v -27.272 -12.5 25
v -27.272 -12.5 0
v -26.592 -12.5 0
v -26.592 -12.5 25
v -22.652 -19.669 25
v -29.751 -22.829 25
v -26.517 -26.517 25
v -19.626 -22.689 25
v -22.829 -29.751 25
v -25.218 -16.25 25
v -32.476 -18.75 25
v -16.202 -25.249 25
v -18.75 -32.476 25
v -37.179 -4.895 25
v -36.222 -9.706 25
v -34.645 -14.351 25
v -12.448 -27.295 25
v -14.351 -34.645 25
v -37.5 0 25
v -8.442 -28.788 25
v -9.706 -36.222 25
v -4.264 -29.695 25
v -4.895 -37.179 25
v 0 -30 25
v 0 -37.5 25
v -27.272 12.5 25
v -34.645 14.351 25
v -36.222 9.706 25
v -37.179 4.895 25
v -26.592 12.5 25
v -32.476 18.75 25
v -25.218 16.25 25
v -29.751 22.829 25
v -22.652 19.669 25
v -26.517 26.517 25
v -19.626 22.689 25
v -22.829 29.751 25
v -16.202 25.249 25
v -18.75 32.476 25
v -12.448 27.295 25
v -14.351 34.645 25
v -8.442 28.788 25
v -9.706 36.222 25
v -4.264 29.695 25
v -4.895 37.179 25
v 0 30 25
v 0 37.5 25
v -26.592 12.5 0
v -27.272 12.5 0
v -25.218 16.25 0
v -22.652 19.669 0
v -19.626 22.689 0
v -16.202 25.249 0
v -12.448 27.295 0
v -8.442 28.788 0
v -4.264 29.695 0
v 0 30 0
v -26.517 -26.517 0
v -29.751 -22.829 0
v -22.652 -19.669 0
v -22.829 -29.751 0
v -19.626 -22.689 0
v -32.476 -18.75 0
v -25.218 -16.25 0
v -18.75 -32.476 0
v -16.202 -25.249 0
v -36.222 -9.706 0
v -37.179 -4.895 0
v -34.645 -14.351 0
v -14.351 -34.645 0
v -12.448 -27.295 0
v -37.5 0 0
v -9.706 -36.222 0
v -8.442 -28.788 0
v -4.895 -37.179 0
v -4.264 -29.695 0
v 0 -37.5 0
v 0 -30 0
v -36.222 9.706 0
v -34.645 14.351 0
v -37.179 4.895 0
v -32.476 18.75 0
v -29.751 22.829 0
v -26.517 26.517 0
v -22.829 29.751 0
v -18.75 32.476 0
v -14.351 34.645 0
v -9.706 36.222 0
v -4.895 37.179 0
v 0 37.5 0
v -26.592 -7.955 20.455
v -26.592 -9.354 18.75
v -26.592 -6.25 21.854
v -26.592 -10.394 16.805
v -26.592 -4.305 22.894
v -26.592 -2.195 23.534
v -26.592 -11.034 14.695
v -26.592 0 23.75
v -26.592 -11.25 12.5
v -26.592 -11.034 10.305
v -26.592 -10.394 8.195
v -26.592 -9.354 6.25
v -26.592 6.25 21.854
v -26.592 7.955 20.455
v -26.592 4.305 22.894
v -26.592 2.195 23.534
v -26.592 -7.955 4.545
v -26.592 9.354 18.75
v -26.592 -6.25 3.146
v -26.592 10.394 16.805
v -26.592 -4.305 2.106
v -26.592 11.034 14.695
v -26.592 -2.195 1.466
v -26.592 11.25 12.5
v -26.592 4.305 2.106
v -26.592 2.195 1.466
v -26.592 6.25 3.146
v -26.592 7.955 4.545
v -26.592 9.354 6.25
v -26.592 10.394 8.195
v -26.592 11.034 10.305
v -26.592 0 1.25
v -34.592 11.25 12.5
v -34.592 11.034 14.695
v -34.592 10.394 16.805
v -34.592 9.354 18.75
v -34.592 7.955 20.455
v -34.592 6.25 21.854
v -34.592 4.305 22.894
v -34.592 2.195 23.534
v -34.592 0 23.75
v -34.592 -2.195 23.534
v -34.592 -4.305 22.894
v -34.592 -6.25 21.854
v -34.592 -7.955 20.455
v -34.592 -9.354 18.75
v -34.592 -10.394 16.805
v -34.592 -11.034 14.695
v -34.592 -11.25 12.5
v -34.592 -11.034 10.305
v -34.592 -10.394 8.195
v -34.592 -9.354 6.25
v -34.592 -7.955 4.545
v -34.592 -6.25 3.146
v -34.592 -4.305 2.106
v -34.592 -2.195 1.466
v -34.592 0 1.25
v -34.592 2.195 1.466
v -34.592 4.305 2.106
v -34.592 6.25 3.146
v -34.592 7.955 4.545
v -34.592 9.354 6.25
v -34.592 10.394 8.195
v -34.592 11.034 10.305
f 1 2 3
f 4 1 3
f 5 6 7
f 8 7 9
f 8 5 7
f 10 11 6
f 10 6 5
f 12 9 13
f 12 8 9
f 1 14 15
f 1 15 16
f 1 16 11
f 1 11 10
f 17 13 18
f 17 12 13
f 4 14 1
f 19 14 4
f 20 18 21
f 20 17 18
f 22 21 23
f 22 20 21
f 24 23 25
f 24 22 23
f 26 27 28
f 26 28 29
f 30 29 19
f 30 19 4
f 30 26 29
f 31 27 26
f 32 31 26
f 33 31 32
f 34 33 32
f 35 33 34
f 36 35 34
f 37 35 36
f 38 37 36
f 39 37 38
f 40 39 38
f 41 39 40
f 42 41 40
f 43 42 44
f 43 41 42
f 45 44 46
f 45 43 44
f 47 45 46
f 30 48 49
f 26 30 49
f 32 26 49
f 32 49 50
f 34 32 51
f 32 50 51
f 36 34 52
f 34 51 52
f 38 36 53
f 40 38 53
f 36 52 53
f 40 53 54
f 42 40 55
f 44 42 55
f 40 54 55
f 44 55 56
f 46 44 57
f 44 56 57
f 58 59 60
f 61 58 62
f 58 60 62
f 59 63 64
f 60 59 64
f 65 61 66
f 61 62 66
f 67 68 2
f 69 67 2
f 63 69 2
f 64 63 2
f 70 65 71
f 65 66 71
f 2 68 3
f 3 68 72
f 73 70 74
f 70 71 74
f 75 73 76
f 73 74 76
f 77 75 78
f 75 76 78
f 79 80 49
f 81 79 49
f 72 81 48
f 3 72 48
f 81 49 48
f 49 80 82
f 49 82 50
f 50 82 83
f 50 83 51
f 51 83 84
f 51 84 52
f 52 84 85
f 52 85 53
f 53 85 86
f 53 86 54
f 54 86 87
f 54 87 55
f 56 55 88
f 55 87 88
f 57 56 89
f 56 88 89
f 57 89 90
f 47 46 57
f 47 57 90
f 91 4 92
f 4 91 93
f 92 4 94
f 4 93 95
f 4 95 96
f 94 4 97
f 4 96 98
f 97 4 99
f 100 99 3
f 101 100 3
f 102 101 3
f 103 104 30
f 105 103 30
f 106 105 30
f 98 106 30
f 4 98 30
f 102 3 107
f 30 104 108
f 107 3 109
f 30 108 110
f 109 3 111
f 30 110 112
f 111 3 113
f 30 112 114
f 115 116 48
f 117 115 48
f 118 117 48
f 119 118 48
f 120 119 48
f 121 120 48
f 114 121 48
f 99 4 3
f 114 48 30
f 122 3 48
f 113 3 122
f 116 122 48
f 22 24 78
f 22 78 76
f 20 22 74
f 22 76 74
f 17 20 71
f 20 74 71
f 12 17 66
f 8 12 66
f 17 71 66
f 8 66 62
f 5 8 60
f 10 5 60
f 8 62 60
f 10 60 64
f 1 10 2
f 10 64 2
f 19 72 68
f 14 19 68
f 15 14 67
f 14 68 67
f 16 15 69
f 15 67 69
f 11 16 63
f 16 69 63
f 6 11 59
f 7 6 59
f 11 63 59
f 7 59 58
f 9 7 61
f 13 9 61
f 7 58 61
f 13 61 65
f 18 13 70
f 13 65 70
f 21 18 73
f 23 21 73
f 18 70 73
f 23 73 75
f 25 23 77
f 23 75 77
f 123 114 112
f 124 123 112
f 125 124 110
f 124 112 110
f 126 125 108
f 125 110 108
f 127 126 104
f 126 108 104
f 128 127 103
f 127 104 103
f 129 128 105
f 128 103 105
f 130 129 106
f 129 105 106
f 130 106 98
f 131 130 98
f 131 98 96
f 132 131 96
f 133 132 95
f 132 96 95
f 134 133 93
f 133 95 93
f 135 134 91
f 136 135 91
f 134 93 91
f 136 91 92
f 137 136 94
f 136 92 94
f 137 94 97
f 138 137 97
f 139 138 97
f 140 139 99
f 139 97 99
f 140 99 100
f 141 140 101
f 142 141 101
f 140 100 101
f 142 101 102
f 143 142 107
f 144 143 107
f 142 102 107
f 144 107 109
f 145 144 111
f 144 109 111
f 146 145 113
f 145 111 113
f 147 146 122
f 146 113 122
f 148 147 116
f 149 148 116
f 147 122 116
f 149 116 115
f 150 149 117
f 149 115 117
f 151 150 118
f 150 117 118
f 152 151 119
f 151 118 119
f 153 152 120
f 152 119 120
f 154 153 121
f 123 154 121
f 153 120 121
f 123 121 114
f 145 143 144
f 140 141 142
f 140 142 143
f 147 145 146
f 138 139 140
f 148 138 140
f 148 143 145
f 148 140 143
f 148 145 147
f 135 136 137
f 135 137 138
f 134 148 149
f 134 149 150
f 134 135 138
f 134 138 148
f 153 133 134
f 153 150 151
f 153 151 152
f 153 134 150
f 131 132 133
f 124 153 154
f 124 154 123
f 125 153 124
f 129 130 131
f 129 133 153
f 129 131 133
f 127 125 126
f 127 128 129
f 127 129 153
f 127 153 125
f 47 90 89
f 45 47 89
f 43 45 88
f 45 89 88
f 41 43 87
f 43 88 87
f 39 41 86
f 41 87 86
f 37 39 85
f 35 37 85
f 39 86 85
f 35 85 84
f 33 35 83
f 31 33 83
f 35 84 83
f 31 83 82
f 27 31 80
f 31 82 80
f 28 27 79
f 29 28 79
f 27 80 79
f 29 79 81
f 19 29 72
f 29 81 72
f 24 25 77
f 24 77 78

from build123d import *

# Parameters (mm, degrees)
F1_DEPTH = 25
F2_R     = 11.25
F3_DEPTH = 8


with BuildPart() as f1:
    # F0 (on Top) → F1 (new body)
    with BuildSketch(Plane.XY):
        with BuildLine():
            ThreePointArc((0, -30), (-16.201852, -25.248762), (-27.27178, -12.5))
            Line((-27.27178, -12.5), (-26.592, -12.5))
            Line((-26.592, -12.5), (-26.592, 0))
            Line((-26.592, 0), (-26.592, 12.5))
            Line((-26.592, 12.5), (-27.27178, 12.5))
            ThreePointArc((-27.27178, 12.5), (-16.201852, 25.248762), (0, 30))
            Line((0, 30), (0, 37.5))
            ThreePointArc((0, 37.5), (-26.516504, 26.516504), (-37.5, 0))
            ThreePointArc((-37.5, 0), (-26.516504, -26.516504), (0, -37.5))
            Line((0, -37.5), (0, -30))
        make_face()
    extrude(amount=F1_DEPTH)

    # F2 (on face) → F3 (cut)
    with BuildSketch(Plane.YZ.offset(-26.592)):
        with Locations((0, 12.5)):
            Circle(F2_R)
    extrude(amount=-F3_DEPTH, mode=Mode.SUBTRACT)


solid = f1.part
